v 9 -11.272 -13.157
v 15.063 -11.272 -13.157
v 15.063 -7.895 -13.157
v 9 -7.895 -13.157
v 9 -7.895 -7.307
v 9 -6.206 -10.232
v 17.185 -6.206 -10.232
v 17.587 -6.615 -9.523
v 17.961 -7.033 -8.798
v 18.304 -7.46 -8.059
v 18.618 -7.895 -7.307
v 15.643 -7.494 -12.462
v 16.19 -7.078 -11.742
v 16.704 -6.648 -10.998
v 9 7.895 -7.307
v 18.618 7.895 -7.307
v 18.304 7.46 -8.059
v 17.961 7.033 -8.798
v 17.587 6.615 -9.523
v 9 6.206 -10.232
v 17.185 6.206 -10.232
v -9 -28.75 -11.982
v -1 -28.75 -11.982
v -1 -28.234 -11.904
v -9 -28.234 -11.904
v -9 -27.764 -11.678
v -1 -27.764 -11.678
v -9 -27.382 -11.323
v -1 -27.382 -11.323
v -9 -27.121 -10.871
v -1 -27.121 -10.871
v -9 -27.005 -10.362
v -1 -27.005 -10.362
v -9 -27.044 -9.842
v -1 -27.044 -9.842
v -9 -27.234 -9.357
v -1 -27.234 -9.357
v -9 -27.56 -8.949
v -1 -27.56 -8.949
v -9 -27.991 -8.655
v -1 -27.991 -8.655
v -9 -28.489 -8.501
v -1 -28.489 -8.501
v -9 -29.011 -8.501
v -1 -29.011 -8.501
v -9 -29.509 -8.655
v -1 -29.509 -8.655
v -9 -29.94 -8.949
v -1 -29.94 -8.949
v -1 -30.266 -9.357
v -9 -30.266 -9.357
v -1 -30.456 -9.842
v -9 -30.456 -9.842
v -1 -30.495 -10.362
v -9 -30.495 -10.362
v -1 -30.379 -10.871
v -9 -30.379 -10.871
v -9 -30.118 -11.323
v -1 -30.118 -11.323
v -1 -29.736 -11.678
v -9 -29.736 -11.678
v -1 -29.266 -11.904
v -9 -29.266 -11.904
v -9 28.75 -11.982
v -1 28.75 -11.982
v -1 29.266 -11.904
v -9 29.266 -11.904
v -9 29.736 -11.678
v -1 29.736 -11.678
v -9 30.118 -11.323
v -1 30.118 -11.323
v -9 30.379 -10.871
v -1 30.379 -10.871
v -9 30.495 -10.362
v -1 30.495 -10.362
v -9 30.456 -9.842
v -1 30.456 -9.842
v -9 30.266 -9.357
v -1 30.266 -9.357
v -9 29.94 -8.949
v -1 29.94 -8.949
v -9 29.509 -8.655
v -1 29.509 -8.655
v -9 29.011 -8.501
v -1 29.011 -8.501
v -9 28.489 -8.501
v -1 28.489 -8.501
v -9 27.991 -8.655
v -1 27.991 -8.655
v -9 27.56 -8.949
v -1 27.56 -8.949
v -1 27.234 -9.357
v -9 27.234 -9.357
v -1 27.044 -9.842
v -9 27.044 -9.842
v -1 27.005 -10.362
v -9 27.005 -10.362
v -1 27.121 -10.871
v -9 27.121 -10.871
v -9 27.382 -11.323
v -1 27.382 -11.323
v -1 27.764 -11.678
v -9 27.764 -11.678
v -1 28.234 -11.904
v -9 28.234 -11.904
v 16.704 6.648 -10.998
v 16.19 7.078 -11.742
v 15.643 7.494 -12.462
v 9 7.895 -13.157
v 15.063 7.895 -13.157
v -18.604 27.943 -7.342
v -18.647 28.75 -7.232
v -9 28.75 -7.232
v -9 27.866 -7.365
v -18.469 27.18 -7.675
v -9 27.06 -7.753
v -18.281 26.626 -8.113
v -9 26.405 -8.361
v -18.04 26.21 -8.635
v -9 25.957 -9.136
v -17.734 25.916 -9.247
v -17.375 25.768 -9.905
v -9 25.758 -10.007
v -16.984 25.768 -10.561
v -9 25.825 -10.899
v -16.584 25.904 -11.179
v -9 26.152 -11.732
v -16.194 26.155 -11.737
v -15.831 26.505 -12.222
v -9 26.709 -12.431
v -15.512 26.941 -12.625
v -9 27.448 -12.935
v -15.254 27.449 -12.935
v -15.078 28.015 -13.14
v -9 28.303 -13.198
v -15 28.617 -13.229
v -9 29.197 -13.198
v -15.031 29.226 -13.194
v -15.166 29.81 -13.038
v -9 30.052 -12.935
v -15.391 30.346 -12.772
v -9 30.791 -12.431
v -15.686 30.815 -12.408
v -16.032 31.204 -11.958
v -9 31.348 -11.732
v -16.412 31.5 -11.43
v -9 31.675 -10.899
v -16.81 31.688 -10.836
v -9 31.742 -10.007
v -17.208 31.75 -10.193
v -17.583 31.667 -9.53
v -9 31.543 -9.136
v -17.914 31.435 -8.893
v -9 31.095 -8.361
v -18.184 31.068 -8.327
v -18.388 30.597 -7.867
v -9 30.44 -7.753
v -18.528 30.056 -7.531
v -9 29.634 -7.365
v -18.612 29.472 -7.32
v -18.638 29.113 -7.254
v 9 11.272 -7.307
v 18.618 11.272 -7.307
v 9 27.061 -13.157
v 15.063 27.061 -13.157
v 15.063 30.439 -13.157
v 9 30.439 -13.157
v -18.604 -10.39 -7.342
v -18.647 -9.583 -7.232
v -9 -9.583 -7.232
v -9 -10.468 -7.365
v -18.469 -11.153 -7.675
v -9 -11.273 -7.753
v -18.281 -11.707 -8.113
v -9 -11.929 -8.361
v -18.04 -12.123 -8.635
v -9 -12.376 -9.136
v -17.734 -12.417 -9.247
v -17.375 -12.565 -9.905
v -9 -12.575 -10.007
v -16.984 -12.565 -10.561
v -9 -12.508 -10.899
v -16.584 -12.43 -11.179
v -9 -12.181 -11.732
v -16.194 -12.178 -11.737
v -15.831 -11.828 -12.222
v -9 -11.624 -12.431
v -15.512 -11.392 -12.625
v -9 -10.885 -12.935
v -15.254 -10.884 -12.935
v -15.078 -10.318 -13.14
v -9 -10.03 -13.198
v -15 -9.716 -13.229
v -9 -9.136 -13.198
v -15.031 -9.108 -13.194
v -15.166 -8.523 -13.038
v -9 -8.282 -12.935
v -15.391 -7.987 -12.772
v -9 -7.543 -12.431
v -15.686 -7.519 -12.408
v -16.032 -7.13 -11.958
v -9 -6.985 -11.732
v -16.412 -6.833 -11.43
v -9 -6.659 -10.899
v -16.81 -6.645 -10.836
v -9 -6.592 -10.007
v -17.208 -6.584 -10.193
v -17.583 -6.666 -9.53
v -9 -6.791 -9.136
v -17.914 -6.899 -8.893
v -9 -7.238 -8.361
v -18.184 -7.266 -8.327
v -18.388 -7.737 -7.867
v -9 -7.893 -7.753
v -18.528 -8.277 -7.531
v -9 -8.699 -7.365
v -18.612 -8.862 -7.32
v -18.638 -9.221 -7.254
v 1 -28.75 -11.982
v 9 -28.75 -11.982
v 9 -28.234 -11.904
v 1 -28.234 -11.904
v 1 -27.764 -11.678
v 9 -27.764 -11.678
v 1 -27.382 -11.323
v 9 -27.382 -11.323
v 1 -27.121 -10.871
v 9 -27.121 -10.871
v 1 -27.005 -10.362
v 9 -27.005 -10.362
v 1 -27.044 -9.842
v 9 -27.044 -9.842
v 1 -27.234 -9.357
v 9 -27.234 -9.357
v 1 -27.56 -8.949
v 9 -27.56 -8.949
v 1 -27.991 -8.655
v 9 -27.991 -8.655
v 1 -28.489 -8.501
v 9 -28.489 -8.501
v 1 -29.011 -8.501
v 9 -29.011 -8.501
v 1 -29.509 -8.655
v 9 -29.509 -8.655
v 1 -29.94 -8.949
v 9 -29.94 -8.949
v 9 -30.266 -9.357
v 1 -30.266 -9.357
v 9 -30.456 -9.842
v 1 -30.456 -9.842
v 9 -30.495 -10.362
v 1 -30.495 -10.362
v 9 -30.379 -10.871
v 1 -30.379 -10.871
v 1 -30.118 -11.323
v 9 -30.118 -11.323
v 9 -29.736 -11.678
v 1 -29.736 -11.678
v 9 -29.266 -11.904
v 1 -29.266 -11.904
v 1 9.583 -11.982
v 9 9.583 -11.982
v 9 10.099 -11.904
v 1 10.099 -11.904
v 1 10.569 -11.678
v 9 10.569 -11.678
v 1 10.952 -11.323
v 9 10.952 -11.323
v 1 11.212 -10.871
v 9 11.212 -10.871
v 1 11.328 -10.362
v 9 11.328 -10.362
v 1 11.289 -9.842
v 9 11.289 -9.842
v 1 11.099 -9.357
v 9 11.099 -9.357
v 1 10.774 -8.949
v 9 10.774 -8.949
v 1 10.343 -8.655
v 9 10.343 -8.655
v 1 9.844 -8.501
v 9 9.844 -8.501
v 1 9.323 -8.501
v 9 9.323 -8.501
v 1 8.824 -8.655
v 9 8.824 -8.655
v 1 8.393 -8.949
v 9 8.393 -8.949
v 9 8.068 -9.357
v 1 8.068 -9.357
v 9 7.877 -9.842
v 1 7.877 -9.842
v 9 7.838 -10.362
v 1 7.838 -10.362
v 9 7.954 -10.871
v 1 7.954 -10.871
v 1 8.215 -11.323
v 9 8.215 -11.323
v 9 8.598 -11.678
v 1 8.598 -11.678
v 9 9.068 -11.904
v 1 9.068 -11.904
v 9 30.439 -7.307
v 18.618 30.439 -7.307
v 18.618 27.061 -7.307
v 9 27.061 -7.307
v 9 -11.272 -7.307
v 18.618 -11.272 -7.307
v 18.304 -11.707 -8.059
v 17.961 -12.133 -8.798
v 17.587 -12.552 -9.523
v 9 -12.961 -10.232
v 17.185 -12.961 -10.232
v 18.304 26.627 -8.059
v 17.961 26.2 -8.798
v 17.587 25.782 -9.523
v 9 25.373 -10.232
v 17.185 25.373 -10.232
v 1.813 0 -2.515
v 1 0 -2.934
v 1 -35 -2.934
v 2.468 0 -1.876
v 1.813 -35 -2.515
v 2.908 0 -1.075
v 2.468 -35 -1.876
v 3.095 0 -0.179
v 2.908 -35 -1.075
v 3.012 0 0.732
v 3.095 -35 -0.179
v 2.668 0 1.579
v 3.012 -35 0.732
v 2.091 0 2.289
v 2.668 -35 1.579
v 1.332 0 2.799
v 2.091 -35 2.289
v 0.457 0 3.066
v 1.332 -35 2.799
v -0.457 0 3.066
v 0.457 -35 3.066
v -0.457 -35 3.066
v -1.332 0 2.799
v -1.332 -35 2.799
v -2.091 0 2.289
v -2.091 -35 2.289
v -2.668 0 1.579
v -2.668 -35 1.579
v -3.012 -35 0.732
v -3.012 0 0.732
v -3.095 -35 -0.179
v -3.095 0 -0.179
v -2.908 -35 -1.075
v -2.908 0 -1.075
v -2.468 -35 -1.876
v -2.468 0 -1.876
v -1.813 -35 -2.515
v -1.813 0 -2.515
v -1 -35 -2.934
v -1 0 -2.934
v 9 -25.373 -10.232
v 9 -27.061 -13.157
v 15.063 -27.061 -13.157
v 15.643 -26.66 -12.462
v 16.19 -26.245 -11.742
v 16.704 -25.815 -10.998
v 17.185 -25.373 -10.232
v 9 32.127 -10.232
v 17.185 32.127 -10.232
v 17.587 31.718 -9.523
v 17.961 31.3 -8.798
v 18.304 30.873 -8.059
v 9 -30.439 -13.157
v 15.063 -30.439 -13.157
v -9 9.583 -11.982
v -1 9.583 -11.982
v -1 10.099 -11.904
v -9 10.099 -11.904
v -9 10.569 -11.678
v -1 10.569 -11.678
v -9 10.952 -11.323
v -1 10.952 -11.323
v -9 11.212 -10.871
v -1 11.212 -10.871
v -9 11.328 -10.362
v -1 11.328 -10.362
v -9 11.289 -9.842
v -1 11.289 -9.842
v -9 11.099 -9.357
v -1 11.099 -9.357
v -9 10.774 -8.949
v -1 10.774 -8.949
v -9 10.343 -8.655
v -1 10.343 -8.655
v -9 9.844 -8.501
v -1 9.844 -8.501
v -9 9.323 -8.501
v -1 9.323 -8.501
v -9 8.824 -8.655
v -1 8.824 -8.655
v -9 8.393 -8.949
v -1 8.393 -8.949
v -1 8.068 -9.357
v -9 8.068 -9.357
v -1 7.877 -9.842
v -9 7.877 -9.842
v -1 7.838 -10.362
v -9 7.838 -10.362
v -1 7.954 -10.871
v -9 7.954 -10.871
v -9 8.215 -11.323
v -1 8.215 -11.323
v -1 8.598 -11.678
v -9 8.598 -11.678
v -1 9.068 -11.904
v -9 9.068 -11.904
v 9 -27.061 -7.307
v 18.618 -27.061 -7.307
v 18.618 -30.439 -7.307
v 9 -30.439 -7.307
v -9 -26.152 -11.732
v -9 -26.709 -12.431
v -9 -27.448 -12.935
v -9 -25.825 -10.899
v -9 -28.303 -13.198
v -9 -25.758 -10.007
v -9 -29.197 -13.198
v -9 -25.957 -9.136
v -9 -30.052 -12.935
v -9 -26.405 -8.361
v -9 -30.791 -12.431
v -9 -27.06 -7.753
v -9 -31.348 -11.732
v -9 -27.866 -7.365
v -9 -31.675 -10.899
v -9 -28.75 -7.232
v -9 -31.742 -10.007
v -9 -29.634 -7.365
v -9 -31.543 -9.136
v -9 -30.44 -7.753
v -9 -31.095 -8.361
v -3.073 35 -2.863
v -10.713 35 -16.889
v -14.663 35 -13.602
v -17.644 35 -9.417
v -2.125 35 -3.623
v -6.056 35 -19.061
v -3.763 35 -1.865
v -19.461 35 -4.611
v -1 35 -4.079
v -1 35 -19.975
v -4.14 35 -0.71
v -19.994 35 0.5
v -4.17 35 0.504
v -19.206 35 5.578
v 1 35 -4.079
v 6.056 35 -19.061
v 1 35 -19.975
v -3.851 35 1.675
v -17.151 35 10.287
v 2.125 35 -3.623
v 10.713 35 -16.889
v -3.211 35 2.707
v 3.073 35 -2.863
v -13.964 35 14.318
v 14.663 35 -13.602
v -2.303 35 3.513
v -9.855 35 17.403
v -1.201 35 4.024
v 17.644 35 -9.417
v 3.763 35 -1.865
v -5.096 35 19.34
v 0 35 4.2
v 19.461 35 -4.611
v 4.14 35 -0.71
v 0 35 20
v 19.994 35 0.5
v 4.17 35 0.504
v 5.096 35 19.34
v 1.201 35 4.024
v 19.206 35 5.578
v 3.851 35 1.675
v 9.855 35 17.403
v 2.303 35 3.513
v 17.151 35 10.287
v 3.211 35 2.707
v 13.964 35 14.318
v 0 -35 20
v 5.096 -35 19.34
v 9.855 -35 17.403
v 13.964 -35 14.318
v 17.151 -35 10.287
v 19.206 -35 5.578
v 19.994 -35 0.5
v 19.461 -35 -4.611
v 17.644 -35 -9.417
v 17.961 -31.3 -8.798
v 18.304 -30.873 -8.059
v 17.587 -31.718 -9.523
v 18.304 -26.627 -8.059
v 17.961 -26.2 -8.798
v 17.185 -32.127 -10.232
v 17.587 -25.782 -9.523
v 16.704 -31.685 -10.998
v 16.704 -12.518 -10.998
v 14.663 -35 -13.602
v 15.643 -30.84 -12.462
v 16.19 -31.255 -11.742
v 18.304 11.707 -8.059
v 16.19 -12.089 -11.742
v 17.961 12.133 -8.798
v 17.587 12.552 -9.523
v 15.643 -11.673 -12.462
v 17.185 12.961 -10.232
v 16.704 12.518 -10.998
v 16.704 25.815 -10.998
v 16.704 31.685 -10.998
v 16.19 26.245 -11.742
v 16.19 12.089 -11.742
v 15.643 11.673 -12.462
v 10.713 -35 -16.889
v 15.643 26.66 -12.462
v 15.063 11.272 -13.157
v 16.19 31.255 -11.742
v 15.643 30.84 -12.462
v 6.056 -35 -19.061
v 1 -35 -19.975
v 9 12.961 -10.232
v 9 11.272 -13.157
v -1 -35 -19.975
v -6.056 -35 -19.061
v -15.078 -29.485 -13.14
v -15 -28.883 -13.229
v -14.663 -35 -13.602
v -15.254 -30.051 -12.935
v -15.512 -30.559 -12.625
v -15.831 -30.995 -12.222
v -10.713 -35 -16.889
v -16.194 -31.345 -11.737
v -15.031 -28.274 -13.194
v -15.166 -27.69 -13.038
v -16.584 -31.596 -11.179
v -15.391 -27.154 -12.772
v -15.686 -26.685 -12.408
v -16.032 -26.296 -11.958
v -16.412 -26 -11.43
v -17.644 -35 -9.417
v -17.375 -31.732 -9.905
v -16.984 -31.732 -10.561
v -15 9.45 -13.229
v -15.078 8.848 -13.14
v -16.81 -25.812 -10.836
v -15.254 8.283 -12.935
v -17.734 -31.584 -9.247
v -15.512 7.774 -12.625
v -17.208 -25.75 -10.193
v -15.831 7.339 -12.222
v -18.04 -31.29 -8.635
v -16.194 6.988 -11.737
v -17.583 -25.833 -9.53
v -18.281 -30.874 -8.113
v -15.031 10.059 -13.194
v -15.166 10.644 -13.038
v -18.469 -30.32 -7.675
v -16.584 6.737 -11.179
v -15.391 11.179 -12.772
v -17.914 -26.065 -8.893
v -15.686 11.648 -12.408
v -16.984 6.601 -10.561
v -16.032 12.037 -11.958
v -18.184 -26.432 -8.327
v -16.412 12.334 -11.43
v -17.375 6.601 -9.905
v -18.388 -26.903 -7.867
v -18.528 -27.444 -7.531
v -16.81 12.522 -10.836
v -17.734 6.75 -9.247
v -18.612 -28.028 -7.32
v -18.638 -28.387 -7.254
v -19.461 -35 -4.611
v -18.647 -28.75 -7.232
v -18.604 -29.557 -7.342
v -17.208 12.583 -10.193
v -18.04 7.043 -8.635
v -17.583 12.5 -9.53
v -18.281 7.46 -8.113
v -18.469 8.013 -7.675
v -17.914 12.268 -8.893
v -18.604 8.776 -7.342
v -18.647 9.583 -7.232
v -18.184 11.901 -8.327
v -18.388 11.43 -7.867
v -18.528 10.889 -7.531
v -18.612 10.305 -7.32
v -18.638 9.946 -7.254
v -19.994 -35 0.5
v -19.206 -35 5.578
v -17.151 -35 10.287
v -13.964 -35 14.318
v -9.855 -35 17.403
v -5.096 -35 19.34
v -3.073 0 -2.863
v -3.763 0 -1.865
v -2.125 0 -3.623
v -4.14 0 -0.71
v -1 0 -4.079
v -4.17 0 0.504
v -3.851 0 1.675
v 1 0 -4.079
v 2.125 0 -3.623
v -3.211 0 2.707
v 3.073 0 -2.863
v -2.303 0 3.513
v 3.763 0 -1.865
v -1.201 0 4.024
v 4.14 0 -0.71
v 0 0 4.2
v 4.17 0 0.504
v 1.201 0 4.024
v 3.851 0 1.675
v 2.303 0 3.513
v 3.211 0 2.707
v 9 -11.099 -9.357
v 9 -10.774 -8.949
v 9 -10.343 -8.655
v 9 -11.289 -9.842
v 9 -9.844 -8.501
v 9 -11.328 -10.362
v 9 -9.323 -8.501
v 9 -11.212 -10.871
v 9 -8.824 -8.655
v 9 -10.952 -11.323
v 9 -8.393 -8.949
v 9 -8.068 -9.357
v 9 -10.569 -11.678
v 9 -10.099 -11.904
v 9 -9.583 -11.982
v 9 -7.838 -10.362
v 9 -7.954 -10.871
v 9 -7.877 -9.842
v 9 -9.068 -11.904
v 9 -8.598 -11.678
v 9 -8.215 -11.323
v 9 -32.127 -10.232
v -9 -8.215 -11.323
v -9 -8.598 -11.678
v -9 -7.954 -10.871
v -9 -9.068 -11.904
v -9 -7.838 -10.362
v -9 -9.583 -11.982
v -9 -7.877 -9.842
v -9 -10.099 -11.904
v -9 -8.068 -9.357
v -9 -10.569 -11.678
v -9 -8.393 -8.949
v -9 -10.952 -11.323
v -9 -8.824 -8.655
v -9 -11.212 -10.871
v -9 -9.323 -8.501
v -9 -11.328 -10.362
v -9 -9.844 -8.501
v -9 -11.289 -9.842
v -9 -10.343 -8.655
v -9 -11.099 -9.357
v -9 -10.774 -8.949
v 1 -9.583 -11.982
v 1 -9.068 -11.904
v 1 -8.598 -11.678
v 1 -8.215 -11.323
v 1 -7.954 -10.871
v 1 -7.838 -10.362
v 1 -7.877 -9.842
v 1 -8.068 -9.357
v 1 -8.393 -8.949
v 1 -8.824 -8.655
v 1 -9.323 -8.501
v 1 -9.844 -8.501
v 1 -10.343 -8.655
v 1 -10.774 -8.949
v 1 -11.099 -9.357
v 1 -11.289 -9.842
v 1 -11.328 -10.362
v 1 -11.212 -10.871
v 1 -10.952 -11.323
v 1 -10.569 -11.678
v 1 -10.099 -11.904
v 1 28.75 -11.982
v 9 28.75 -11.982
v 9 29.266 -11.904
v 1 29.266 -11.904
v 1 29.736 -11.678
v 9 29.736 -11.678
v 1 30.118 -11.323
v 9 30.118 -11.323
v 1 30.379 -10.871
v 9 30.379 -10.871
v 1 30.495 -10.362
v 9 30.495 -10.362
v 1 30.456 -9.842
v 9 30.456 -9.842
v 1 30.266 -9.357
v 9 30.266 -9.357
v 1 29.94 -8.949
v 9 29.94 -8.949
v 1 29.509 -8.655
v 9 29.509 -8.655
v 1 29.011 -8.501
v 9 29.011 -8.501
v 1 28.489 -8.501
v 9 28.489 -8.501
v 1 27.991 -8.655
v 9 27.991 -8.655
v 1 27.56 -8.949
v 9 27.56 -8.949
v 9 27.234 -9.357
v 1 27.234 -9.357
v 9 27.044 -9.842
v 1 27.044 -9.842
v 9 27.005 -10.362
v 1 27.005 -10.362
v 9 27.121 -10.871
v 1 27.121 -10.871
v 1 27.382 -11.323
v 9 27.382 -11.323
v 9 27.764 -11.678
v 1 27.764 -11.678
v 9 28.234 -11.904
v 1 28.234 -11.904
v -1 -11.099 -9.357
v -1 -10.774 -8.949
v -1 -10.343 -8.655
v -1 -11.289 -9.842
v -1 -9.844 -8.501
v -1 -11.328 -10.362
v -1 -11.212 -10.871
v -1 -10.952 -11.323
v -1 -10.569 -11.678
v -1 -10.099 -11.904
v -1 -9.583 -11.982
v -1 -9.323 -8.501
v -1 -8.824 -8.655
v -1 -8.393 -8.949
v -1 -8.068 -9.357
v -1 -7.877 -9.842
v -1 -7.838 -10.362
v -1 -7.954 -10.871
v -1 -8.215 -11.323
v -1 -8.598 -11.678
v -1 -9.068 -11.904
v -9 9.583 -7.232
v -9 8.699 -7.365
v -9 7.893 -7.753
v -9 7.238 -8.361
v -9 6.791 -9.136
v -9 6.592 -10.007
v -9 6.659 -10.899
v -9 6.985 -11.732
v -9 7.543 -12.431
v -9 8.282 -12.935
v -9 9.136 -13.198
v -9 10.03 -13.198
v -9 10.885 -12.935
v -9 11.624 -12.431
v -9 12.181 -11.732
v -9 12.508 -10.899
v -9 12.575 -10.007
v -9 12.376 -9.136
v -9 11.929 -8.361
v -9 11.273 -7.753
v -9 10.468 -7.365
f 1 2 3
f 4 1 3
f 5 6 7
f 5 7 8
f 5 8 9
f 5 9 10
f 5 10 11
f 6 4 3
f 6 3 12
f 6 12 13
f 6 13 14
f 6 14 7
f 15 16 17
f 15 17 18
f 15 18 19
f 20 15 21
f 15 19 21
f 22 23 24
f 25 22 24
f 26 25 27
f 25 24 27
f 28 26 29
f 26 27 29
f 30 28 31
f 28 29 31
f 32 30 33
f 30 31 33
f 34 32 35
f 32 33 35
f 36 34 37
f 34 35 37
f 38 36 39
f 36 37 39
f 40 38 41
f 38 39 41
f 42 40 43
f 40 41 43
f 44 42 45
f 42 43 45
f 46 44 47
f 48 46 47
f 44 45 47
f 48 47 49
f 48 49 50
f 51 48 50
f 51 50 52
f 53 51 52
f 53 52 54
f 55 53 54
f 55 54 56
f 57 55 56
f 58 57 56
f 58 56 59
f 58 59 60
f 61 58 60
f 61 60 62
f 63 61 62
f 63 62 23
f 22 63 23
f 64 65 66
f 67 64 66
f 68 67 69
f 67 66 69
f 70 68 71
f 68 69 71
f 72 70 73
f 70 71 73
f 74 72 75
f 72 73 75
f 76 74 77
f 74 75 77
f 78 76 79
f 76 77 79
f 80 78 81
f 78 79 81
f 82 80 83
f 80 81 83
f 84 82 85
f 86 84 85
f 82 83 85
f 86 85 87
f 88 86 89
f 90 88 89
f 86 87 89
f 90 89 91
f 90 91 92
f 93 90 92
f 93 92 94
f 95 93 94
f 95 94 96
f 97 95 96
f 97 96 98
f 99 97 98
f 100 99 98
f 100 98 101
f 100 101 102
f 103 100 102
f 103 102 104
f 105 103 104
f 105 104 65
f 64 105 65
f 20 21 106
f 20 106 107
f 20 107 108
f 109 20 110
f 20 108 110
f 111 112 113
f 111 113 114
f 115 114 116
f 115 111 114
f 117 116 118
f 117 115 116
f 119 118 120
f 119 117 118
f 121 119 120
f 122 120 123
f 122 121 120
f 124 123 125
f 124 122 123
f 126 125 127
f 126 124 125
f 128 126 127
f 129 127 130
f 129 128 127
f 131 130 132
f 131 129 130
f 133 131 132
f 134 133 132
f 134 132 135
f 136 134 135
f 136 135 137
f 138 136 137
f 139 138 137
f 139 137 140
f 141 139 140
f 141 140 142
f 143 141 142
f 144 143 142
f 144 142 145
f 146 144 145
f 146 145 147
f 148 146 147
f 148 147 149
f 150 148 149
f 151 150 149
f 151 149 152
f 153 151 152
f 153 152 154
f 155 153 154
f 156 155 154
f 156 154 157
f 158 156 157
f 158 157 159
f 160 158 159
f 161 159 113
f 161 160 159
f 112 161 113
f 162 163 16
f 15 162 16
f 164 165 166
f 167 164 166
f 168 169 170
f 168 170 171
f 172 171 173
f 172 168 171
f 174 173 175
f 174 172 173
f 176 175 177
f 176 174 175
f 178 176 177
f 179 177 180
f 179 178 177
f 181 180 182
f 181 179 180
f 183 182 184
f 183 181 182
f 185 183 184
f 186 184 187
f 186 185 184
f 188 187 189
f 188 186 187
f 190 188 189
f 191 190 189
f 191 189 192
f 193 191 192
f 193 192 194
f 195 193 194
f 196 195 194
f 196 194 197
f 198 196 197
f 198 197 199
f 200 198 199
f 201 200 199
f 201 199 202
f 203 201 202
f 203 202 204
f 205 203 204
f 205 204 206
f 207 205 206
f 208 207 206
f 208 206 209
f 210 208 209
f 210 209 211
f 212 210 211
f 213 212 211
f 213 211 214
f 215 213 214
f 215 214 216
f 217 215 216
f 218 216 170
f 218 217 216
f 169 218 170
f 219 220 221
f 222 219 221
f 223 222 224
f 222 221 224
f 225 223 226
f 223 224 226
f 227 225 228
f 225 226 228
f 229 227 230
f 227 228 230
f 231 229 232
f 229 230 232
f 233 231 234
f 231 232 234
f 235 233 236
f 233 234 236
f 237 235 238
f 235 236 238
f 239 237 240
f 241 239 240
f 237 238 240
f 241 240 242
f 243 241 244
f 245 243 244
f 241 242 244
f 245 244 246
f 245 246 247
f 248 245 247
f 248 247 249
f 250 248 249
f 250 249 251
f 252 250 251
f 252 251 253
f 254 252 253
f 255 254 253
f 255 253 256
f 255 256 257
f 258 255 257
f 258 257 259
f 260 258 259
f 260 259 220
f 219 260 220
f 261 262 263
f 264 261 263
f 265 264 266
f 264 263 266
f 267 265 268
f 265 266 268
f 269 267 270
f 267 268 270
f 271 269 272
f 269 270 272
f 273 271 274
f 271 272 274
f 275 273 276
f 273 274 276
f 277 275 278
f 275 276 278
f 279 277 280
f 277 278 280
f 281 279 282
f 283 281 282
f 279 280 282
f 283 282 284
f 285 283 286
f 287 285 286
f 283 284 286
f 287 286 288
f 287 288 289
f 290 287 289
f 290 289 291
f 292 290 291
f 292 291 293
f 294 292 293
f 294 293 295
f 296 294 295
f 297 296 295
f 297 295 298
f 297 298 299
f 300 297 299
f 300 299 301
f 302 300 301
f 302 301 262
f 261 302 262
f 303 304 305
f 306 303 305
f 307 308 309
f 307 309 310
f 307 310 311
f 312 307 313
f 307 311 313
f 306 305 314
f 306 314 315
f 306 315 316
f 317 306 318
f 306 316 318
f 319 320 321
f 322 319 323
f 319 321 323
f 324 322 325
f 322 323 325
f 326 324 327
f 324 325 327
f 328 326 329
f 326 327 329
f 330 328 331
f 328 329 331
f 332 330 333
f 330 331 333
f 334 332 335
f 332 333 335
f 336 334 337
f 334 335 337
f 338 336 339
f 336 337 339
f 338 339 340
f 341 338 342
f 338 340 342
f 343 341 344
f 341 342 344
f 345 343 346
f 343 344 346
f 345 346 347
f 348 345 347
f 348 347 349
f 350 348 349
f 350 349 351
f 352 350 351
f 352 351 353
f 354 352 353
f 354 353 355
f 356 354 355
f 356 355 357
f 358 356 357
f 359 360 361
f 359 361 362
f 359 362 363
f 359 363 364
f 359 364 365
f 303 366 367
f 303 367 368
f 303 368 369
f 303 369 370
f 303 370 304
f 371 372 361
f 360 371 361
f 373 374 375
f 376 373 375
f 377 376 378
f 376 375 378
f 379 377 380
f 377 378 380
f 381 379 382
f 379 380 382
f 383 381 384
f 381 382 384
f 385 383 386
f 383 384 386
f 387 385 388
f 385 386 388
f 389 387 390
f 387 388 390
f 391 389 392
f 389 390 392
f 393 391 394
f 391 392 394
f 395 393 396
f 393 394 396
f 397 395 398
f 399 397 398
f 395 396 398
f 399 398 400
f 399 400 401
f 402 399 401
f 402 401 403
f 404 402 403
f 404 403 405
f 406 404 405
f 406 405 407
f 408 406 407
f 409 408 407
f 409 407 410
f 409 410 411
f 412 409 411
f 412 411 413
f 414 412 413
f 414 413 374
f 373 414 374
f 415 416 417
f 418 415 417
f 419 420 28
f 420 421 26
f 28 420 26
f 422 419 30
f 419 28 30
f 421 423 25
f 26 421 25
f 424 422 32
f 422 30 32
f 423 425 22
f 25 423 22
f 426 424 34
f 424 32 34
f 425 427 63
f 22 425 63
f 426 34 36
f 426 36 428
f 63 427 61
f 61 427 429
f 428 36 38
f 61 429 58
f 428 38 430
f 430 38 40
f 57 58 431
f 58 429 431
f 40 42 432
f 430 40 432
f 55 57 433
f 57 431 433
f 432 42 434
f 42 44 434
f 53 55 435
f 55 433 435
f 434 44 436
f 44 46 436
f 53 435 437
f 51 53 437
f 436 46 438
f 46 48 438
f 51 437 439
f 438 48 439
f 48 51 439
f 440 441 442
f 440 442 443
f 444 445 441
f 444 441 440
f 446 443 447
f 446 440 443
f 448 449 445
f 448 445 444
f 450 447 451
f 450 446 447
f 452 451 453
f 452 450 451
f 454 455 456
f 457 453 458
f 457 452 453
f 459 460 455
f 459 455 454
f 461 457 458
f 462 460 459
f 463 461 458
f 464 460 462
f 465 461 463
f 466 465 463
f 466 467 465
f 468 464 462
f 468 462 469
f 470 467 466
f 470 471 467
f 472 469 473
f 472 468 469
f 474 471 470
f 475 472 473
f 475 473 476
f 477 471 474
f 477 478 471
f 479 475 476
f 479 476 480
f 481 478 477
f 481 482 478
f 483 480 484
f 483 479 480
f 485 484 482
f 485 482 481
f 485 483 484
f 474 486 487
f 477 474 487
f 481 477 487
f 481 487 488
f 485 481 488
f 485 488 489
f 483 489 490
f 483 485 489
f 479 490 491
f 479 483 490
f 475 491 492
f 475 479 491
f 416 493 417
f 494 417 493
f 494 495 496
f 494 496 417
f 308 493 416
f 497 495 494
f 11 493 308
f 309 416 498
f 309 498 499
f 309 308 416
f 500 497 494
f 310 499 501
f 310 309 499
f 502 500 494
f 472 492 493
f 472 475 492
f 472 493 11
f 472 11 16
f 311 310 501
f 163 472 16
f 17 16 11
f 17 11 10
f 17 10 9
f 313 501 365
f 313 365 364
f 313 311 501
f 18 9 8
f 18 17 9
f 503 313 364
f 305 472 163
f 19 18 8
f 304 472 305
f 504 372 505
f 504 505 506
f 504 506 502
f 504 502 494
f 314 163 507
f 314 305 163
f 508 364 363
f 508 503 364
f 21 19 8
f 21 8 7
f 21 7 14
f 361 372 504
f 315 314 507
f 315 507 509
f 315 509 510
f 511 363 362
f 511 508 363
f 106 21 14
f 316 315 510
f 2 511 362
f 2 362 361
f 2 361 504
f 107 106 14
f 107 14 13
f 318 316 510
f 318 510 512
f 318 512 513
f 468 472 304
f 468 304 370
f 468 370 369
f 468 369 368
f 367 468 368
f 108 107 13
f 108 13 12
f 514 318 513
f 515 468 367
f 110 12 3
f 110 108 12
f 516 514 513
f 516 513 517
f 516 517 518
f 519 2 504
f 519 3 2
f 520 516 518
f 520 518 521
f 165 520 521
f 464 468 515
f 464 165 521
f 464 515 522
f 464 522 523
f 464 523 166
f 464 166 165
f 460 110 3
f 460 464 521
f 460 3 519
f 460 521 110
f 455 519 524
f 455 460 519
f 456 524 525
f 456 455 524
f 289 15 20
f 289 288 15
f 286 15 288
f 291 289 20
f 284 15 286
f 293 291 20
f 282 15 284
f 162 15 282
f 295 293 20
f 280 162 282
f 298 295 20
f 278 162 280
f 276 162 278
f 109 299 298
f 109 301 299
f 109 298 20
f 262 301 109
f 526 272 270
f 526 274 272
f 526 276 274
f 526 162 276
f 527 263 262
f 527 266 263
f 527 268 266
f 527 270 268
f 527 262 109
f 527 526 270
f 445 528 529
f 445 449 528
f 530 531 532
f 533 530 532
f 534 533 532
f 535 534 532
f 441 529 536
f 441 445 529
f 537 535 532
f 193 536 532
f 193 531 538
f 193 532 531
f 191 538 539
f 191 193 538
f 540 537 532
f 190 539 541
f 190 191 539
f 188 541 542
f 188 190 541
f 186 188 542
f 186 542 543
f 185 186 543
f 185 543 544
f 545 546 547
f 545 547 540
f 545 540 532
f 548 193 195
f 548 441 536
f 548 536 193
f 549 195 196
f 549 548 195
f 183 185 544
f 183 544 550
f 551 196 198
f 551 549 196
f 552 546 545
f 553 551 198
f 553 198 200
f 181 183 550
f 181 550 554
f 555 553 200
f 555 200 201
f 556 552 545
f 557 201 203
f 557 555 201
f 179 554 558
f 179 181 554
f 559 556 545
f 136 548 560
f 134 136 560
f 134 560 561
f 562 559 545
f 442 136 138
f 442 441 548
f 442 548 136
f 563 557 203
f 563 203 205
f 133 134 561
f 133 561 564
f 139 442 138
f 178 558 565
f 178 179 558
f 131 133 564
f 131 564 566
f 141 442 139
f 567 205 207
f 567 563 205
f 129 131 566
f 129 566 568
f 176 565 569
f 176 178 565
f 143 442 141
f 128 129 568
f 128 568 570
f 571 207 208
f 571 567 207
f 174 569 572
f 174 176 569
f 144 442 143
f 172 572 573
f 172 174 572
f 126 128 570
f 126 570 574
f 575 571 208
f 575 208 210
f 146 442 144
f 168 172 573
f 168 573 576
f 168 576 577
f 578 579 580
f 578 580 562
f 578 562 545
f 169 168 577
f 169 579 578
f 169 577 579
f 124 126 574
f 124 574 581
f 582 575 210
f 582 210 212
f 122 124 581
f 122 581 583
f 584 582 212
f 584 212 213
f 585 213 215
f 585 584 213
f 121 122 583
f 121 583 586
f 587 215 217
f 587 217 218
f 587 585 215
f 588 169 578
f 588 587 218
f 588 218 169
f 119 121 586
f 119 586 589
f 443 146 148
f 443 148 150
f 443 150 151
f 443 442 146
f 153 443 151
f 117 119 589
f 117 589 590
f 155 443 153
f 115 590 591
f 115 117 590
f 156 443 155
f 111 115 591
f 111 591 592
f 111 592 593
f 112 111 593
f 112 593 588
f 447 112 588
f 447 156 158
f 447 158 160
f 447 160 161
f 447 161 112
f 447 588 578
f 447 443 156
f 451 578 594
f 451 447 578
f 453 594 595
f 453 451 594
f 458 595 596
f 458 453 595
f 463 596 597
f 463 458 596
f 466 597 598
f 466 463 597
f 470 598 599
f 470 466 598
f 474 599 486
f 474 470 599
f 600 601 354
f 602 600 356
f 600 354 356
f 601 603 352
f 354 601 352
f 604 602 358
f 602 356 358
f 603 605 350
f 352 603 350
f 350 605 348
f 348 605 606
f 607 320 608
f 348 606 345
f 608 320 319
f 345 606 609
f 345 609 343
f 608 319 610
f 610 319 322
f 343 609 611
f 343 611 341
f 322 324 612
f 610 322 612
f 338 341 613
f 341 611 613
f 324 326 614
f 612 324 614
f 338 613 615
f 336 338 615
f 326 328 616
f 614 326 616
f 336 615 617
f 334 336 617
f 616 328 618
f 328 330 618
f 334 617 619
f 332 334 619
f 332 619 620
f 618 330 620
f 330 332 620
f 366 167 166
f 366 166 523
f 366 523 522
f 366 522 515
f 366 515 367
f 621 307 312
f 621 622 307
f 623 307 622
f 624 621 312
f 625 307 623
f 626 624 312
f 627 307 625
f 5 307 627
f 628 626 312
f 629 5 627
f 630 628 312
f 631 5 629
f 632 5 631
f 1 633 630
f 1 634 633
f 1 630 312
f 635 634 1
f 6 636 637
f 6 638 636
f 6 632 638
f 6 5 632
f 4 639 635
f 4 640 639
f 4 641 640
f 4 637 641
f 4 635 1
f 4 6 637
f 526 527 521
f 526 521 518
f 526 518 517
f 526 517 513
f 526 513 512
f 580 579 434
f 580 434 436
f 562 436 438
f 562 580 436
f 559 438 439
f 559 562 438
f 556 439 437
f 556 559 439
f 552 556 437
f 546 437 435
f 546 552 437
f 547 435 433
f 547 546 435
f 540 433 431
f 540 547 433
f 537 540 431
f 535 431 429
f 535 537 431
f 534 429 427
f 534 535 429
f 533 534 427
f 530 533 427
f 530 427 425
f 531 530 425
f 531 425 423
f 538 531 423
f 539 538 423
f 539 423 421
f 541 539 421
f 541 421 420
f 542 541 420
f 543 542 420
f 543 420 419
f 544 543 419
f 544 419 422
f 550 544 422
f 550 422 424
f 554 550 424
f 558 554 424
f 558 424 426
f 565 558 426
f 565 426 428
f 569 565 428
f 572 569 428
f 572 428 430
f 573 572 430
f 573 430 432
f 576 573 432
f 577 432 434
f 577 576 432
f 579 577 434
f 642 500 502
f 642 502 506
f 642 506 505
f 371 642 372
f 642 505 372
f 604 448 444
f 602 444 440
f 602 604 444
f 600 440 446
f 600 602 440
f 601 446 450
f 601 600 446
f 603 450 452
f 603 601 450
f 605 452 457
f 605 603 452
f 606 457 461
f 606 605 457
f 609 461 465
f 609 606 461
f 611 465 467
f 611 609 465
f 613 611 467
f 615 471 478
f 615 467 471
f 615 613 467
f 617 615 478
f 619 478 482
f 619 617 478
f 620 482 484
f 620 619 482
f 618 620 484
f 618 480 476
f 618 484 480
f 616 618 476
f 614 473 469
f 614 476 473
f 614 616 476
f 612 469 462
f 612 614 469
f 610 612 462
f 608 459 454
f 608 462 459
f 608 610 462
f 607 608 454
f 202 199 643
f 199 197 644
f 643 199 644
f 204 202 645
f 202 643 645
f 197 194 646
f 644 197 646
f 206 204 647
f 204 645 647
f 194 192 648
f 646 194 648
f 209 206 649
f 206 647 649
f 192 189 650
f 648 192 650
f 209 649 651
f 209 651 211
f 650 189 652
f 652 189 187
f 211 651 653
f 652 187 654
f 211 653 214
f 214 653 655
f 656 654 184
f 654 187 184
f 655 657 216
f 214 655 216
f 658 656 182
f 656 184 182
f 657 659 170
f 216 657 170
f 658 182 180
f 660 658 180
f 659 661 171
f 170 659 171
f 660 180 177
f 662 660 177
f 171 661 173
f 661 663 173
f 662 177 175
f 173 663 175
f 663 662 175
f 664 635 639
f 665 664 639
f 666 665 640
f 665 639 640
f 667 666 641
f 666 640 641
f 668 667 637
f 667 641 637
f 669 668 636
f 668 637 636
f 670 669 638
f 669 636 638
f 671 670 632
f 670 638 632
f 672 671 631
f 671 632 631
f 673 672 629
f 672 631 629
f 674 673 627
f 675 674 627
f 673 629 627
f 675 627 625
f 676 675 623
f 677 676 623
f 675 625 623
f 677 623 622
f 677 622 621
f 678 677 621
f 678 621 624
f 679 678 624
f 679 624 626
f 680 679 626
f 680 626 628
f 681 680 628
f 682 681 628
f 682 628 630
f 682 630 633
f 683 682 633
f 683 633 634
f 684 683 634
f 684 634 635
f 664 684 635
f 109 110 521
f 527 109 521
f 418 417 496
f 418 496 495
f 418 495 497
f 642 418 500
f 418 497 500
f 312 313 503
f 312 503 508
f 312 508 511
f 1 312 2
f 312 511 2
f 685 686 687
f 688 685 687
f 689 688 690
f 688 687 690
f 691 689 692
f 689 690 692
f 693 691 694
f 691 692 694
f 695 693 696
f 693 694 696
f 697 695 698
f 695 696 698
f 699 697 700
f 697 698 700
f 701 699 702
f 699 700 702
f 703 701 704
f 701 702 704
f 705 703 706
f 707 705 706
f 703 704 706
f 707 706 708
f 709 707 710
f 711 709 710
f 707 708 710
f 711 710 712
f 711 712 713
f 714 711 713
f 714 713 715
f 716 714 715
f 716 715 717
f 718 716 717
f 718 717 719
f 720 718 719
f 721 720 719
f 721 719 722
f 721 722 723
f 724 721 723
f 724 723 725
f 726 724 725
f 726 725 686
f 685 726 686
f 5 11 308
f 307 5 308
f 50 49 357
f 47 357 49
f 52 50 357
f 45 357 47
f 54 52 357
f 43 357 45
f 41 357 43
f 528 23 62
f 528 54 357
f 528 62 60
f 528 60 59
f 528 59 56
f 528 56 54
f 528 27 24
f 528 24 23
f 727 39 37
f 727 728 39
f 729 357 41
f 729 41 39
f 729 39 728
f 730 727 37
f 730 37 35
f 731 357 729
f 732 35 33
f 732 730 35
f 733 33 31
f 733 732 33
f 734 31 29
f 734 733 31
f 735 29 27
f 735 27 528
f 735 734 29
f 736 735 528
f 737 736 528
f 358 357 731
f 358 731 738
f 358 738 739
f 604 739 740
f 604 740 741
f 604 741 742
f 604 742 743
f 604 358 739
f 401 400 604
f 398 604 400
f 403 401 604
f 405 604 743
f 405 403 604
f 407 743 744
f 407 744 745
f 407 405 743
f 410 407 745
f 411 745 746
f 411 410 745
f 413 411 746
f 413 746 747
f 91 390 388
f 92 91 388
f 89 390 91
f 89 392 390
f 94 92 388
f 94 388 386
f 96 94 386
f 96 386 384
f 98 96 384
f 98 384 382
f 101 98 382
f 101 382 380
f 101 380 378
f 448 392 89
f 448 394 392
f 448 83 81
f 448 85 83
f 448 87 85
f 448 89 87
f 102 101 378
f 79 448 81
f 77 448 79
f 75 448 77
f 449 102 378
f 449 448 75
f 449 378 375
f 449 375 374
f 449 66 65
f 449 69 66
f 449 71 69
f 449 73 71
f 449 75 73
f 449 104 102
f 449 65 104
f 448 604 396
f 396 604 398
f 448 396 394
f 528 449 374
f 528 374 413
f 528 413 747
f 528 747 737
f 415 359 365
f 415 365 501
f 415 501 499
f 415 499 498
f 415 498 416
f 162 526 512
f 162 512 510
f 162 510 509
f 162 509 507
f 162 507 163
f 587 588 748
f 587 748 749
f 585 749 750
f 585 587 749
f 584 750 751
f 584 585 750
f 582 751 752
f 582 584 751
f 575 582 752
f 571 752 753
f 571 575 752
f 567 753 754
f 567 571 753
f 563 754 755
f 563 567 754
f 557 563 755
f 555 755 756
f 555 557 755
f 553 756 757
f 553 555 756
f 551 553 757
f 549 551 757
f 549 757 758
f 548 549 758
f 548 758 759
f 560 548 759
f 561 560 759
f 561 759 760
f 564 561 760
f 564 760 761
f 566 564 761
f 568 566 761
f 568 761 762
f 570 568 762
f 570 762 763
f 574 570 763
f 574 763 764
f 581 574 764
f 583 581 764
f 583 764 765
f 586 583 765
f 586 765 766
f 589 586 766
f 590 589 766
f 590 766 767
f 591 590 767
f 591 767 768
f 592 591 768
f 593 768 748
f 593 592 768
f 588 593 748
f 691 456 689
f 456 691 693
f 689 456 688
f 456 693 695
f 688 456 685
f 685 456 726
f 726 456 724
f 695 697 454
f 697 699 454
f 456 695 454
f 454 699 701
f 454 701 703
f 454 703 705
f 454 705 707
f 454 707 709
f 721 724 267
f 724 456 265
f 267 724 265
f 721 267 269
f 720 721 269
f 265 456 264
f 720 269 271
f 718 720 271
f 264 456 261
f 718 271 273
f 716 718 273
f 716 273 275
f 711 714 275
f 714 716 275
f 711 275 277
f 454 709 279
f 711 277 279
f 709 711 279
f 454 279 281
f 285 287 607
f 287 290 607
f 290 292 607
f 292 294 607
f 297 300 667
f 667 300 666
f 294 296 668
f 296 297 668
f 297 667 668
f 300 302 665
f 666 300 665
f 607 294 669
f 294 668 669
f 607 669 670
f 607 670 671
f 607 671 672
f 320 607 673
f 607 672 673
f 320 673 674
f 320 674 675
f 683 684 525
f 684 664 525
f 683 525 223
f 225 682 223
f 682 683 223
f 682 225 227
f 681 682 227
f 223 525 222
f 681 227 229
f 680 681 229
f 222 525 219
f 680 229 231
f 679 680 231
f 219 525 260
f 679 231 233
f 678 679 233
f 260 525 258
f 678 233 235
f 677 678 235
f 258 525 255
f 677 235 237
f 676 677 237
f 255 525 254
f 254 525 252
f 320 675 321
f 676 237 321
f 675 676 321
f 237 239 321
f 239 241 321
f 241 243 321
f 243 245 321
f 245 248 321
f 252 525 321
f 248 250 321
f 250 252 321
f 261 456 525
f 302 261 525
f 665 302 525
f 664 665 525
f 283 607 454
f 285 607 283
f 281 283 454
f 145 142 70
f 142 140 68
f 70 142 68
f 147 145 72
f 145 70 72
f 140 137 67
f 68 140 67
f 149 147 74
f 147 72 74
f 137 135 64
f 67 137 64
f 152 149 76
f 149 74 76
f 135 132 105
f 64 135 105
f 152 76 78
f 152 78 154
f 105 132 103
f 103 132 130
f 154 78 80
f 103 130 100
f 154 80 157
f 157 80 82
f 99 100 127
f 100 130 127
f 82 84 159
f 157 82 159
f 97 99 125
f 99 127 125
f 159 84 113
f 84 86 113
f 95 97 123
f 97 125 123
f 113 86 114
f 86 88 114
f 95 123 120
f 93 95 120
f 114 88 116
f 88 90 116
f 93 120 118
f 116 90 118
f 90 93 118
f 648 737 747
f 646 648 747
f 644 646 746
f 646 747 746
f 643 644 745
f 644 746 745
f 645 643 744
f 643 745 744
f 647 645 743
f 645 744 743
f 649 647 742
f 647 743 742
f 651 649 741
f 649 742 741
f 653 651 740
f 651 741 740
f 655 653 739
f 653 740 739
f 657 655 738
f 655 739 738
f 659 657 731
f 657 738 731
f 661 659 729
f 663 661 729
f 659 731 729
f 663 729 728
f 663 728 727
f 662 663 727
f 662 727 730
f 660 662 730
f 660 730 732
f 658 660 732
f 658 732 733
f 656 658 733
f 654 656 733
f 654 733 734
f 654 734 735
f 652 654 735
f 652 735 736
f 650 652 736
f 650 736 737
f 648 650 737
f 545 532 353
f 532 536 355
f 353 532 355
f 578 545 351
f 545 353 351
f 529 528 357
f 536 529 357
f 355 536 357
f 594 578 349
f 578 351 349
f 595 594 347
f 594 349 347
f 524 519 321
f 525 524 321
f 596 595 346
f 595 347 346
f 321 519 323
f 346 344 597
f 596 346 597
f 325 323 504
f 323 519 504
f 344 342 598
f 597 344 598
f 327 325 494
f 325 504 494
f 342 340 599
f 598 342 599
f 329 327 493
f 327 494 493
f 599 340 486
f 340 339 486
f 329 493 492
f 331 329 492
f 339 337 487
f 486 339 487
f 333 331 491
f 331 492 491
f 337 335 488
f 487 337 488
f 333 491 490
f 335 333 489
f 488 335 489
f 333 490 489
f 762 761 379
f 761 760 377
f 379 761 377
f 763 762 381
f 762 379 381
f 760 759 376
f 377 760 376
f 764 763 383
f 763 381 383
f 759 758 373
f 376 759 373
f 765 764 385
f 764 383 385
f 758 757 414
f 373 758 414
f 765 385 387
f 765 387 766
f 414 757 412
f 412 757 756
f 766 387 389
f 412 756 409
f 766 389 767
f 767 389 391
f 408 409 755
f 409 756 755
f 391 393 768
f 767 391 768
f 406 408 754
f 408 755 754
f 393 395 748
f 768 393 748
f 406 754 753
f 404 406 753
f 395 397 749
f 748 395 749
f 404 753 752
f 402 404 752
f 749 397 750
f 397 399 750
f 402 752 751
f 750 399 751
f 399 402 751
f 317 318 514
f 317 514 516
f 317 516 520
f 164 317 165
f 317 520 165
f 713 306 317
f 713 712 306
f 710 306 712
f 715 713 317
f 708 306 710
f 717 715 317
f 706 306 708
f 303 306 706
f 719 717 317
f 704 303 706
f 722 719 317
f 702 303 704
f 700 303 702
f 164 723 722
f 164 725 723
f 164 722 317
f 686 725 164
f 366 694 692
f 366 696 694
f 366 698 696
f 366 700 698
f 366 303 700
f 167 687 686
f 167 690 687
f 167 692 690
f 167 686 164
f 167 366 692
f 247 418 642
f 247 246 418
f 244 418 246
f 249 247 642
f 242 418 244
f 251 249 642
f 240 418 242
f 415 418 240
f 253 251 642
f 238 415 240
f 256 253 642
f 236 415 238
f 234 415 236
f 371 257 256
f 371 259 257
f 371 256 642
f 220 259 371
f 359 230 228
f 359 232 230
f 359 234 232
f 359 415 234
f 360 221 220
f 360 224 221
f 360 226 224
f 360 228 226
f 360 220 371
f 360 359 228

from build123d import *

# Parameters (mm, degrees)
SKETCH1_R           = 20
SKETCH1_R_2         = 4.2
BOSS_EXTRUDE1_DEPTH = 35
SKETCH2_W           = 2
SKETCH2_H           = 25
CUT_EXTRUDE1_DEPTH  = 35
SKETCH4_R           = 1.75
CUT_EXTRUDE2_DEPTH  = 40
CUT_EXTRUDE3_DEPTH  = 11
SKETCH6_R           = 3
CUT_EXTRUDE4_DEPTH  = 11
SKETCH7_R           = 4.35
SKETCH7_R_2         = 3.1
BOSS_EXTRUDE2_DEPTH = 35
SKETCH8_W           = 2
SKETCH8_H           = 8.930849086
CUT_EXTRUDE5_DEPTH  = 50


with BuildPart() as part:
    # Sketch1 → Boss-Extrude1 (new, symmetric)
    with BuildSketch(Plane(origin=(0, 0, 0), x_dir=(1, 0, 0), z_dir=(0, 1, 0))):
        with Locations(Location((0, 0, 0), (0, 0, 270))):
            Circle(SKETCH1_R)
        with Locations(Location((0, 0, 0), (0, 0, 270))):
            Circle(SKETCH1_R_2, mode=Mode.SUBTRACT)
    extrude(amount=BOSS_EXTRUDE1_DEPTH, both=True)

    # Sketch2 → Cut-Extrude1 (cut, symmetric)
    with BuildSketch(Plane(origin=(0, 0, 0), x_dir=(1, 0, 0), z_dir=(0, 1, 0))):
        with Locations((0, 12.5)):
            Rectangle(SKETCH2_W, SKETCH2_H)
    extrude(amount=CUT_EXTRUDE1_DEPTH, both=True, mode=Mode.SUBTRACT)

    # Sketch4 → Cut-Extrude2 (cut)
    with BuildSketch(Plane(origin=(20, 0, 0), x_dir=(0, 0, -1), z_dir=(1, 0, 0))):
        with Locations((10.231687805, 28.75)):
            Circle(SKETCH4_R)
        with Locations((10.231687805, 9.583333333)):
            Circle(SKETCH4_R)
        with Locations((10.231687805, -9.583333333)):
            Circle(SKETCH4_R)
        with Locations((10.231687805, -28.75)):
            Circle(SKETCH4_R)
    extrude(amount=-CUT_EXTRUDE2_DEPTH, mode=Mode.SUBTRACT)

    # Sketch5 → Cut-Extrude3 (cut)
    with BuildSketch(Plane(origin=(20, 0, 0), x_dir=(0, 0, -1), z_dir=(1, 0, 0))):
        Polygon((7.306687805, 7.894583798), (10.231687805, 6.20583426), (13.156687805, 7.894583798), (13.156687805, 11.272082872), (10.231687805, 12.96083241), (7.306687805, 11.272082872), align=None)
        Polygon((10.231687805, 32.127499075), (7.306687805, 30.438749537), (7.306687805, 27.061250463), (10.231687805, 25.372500925), (13.156687805, 27.061250463), (13.156687805, 30.438749537), align=None)
        Polygon((7.306687805, -11.272082868), (10.231687805, -12.960832405), (13.156687805, -11.272082868), (13.156687805, -7.894583793), (10.231687805, -6.205834255), (7.306687805, -7.894583793), align=None)
        Polygon((7.306687805, -30.438749533), (10.231687805, -32.12749907), (13.156687805, -30.438749533), (13.156687805, -27.061250458), (10.231687805, -25.37250092), (7.306687805, -27.061250458), align=None)
    extrude(amount=-CUT_EXTRUDE3_DEPTH, mode=Mode.SUBTRACT)

    # Sketch6 → Cut-Extrude4 (cut)
    with BuildSketch(Plane(origin=(-20, 0, 0), x_dir=(0, 0, -1), z_dir=(1, 0, 0))):
        with Locations(Location((10.231687805, 28.75, 0), (0, 0, 180))):
            Circle(SKETCH6_R)
        with Locations(Location((10.231687805, 9.583333333, 0), (0, 0, 180))):
            Circle(SKETCH6_R)
        with Locations(Location((10.231687805, -9.583333333, 0), (0, 0, 180))):
            Circle(SKETCH6_R)
        with Locations(Location((10.231687805, -28.75, 0), (0, 0, 180))):
            Circle(SKETCH6_R)
    extrude(amount=CUT_EXTRUDE4_DEPTH, mode=Mode.SUBTRACT)

    # Sketch7 → Boss-Extrude2 (add)
    with BuildSketch(Plane.XZ.offset(35)):
        Circle(SKETCH7_R)
        with Locations(Location((0, 0, 0), (0, 0, 270))):
            Circle(SKETCH7_R_2, mode=Mode.SUBTRACT)
    extrude(amount=-BOSS_EXTRUDE2_DEPTH)

    # Sketch8 → Cut-Extrude5 (cut)
    with BuildSketch(Plane.XZ.offset(35)):
        with Locations((0, -5.775706359)):
            Rectangle(SKETCH8_W, SKETCH8_H)
    extrude(amount=-CUT_EXTRUDE5_DEPTH, mode=Mode.SUBTRACT)


solid = part.part
